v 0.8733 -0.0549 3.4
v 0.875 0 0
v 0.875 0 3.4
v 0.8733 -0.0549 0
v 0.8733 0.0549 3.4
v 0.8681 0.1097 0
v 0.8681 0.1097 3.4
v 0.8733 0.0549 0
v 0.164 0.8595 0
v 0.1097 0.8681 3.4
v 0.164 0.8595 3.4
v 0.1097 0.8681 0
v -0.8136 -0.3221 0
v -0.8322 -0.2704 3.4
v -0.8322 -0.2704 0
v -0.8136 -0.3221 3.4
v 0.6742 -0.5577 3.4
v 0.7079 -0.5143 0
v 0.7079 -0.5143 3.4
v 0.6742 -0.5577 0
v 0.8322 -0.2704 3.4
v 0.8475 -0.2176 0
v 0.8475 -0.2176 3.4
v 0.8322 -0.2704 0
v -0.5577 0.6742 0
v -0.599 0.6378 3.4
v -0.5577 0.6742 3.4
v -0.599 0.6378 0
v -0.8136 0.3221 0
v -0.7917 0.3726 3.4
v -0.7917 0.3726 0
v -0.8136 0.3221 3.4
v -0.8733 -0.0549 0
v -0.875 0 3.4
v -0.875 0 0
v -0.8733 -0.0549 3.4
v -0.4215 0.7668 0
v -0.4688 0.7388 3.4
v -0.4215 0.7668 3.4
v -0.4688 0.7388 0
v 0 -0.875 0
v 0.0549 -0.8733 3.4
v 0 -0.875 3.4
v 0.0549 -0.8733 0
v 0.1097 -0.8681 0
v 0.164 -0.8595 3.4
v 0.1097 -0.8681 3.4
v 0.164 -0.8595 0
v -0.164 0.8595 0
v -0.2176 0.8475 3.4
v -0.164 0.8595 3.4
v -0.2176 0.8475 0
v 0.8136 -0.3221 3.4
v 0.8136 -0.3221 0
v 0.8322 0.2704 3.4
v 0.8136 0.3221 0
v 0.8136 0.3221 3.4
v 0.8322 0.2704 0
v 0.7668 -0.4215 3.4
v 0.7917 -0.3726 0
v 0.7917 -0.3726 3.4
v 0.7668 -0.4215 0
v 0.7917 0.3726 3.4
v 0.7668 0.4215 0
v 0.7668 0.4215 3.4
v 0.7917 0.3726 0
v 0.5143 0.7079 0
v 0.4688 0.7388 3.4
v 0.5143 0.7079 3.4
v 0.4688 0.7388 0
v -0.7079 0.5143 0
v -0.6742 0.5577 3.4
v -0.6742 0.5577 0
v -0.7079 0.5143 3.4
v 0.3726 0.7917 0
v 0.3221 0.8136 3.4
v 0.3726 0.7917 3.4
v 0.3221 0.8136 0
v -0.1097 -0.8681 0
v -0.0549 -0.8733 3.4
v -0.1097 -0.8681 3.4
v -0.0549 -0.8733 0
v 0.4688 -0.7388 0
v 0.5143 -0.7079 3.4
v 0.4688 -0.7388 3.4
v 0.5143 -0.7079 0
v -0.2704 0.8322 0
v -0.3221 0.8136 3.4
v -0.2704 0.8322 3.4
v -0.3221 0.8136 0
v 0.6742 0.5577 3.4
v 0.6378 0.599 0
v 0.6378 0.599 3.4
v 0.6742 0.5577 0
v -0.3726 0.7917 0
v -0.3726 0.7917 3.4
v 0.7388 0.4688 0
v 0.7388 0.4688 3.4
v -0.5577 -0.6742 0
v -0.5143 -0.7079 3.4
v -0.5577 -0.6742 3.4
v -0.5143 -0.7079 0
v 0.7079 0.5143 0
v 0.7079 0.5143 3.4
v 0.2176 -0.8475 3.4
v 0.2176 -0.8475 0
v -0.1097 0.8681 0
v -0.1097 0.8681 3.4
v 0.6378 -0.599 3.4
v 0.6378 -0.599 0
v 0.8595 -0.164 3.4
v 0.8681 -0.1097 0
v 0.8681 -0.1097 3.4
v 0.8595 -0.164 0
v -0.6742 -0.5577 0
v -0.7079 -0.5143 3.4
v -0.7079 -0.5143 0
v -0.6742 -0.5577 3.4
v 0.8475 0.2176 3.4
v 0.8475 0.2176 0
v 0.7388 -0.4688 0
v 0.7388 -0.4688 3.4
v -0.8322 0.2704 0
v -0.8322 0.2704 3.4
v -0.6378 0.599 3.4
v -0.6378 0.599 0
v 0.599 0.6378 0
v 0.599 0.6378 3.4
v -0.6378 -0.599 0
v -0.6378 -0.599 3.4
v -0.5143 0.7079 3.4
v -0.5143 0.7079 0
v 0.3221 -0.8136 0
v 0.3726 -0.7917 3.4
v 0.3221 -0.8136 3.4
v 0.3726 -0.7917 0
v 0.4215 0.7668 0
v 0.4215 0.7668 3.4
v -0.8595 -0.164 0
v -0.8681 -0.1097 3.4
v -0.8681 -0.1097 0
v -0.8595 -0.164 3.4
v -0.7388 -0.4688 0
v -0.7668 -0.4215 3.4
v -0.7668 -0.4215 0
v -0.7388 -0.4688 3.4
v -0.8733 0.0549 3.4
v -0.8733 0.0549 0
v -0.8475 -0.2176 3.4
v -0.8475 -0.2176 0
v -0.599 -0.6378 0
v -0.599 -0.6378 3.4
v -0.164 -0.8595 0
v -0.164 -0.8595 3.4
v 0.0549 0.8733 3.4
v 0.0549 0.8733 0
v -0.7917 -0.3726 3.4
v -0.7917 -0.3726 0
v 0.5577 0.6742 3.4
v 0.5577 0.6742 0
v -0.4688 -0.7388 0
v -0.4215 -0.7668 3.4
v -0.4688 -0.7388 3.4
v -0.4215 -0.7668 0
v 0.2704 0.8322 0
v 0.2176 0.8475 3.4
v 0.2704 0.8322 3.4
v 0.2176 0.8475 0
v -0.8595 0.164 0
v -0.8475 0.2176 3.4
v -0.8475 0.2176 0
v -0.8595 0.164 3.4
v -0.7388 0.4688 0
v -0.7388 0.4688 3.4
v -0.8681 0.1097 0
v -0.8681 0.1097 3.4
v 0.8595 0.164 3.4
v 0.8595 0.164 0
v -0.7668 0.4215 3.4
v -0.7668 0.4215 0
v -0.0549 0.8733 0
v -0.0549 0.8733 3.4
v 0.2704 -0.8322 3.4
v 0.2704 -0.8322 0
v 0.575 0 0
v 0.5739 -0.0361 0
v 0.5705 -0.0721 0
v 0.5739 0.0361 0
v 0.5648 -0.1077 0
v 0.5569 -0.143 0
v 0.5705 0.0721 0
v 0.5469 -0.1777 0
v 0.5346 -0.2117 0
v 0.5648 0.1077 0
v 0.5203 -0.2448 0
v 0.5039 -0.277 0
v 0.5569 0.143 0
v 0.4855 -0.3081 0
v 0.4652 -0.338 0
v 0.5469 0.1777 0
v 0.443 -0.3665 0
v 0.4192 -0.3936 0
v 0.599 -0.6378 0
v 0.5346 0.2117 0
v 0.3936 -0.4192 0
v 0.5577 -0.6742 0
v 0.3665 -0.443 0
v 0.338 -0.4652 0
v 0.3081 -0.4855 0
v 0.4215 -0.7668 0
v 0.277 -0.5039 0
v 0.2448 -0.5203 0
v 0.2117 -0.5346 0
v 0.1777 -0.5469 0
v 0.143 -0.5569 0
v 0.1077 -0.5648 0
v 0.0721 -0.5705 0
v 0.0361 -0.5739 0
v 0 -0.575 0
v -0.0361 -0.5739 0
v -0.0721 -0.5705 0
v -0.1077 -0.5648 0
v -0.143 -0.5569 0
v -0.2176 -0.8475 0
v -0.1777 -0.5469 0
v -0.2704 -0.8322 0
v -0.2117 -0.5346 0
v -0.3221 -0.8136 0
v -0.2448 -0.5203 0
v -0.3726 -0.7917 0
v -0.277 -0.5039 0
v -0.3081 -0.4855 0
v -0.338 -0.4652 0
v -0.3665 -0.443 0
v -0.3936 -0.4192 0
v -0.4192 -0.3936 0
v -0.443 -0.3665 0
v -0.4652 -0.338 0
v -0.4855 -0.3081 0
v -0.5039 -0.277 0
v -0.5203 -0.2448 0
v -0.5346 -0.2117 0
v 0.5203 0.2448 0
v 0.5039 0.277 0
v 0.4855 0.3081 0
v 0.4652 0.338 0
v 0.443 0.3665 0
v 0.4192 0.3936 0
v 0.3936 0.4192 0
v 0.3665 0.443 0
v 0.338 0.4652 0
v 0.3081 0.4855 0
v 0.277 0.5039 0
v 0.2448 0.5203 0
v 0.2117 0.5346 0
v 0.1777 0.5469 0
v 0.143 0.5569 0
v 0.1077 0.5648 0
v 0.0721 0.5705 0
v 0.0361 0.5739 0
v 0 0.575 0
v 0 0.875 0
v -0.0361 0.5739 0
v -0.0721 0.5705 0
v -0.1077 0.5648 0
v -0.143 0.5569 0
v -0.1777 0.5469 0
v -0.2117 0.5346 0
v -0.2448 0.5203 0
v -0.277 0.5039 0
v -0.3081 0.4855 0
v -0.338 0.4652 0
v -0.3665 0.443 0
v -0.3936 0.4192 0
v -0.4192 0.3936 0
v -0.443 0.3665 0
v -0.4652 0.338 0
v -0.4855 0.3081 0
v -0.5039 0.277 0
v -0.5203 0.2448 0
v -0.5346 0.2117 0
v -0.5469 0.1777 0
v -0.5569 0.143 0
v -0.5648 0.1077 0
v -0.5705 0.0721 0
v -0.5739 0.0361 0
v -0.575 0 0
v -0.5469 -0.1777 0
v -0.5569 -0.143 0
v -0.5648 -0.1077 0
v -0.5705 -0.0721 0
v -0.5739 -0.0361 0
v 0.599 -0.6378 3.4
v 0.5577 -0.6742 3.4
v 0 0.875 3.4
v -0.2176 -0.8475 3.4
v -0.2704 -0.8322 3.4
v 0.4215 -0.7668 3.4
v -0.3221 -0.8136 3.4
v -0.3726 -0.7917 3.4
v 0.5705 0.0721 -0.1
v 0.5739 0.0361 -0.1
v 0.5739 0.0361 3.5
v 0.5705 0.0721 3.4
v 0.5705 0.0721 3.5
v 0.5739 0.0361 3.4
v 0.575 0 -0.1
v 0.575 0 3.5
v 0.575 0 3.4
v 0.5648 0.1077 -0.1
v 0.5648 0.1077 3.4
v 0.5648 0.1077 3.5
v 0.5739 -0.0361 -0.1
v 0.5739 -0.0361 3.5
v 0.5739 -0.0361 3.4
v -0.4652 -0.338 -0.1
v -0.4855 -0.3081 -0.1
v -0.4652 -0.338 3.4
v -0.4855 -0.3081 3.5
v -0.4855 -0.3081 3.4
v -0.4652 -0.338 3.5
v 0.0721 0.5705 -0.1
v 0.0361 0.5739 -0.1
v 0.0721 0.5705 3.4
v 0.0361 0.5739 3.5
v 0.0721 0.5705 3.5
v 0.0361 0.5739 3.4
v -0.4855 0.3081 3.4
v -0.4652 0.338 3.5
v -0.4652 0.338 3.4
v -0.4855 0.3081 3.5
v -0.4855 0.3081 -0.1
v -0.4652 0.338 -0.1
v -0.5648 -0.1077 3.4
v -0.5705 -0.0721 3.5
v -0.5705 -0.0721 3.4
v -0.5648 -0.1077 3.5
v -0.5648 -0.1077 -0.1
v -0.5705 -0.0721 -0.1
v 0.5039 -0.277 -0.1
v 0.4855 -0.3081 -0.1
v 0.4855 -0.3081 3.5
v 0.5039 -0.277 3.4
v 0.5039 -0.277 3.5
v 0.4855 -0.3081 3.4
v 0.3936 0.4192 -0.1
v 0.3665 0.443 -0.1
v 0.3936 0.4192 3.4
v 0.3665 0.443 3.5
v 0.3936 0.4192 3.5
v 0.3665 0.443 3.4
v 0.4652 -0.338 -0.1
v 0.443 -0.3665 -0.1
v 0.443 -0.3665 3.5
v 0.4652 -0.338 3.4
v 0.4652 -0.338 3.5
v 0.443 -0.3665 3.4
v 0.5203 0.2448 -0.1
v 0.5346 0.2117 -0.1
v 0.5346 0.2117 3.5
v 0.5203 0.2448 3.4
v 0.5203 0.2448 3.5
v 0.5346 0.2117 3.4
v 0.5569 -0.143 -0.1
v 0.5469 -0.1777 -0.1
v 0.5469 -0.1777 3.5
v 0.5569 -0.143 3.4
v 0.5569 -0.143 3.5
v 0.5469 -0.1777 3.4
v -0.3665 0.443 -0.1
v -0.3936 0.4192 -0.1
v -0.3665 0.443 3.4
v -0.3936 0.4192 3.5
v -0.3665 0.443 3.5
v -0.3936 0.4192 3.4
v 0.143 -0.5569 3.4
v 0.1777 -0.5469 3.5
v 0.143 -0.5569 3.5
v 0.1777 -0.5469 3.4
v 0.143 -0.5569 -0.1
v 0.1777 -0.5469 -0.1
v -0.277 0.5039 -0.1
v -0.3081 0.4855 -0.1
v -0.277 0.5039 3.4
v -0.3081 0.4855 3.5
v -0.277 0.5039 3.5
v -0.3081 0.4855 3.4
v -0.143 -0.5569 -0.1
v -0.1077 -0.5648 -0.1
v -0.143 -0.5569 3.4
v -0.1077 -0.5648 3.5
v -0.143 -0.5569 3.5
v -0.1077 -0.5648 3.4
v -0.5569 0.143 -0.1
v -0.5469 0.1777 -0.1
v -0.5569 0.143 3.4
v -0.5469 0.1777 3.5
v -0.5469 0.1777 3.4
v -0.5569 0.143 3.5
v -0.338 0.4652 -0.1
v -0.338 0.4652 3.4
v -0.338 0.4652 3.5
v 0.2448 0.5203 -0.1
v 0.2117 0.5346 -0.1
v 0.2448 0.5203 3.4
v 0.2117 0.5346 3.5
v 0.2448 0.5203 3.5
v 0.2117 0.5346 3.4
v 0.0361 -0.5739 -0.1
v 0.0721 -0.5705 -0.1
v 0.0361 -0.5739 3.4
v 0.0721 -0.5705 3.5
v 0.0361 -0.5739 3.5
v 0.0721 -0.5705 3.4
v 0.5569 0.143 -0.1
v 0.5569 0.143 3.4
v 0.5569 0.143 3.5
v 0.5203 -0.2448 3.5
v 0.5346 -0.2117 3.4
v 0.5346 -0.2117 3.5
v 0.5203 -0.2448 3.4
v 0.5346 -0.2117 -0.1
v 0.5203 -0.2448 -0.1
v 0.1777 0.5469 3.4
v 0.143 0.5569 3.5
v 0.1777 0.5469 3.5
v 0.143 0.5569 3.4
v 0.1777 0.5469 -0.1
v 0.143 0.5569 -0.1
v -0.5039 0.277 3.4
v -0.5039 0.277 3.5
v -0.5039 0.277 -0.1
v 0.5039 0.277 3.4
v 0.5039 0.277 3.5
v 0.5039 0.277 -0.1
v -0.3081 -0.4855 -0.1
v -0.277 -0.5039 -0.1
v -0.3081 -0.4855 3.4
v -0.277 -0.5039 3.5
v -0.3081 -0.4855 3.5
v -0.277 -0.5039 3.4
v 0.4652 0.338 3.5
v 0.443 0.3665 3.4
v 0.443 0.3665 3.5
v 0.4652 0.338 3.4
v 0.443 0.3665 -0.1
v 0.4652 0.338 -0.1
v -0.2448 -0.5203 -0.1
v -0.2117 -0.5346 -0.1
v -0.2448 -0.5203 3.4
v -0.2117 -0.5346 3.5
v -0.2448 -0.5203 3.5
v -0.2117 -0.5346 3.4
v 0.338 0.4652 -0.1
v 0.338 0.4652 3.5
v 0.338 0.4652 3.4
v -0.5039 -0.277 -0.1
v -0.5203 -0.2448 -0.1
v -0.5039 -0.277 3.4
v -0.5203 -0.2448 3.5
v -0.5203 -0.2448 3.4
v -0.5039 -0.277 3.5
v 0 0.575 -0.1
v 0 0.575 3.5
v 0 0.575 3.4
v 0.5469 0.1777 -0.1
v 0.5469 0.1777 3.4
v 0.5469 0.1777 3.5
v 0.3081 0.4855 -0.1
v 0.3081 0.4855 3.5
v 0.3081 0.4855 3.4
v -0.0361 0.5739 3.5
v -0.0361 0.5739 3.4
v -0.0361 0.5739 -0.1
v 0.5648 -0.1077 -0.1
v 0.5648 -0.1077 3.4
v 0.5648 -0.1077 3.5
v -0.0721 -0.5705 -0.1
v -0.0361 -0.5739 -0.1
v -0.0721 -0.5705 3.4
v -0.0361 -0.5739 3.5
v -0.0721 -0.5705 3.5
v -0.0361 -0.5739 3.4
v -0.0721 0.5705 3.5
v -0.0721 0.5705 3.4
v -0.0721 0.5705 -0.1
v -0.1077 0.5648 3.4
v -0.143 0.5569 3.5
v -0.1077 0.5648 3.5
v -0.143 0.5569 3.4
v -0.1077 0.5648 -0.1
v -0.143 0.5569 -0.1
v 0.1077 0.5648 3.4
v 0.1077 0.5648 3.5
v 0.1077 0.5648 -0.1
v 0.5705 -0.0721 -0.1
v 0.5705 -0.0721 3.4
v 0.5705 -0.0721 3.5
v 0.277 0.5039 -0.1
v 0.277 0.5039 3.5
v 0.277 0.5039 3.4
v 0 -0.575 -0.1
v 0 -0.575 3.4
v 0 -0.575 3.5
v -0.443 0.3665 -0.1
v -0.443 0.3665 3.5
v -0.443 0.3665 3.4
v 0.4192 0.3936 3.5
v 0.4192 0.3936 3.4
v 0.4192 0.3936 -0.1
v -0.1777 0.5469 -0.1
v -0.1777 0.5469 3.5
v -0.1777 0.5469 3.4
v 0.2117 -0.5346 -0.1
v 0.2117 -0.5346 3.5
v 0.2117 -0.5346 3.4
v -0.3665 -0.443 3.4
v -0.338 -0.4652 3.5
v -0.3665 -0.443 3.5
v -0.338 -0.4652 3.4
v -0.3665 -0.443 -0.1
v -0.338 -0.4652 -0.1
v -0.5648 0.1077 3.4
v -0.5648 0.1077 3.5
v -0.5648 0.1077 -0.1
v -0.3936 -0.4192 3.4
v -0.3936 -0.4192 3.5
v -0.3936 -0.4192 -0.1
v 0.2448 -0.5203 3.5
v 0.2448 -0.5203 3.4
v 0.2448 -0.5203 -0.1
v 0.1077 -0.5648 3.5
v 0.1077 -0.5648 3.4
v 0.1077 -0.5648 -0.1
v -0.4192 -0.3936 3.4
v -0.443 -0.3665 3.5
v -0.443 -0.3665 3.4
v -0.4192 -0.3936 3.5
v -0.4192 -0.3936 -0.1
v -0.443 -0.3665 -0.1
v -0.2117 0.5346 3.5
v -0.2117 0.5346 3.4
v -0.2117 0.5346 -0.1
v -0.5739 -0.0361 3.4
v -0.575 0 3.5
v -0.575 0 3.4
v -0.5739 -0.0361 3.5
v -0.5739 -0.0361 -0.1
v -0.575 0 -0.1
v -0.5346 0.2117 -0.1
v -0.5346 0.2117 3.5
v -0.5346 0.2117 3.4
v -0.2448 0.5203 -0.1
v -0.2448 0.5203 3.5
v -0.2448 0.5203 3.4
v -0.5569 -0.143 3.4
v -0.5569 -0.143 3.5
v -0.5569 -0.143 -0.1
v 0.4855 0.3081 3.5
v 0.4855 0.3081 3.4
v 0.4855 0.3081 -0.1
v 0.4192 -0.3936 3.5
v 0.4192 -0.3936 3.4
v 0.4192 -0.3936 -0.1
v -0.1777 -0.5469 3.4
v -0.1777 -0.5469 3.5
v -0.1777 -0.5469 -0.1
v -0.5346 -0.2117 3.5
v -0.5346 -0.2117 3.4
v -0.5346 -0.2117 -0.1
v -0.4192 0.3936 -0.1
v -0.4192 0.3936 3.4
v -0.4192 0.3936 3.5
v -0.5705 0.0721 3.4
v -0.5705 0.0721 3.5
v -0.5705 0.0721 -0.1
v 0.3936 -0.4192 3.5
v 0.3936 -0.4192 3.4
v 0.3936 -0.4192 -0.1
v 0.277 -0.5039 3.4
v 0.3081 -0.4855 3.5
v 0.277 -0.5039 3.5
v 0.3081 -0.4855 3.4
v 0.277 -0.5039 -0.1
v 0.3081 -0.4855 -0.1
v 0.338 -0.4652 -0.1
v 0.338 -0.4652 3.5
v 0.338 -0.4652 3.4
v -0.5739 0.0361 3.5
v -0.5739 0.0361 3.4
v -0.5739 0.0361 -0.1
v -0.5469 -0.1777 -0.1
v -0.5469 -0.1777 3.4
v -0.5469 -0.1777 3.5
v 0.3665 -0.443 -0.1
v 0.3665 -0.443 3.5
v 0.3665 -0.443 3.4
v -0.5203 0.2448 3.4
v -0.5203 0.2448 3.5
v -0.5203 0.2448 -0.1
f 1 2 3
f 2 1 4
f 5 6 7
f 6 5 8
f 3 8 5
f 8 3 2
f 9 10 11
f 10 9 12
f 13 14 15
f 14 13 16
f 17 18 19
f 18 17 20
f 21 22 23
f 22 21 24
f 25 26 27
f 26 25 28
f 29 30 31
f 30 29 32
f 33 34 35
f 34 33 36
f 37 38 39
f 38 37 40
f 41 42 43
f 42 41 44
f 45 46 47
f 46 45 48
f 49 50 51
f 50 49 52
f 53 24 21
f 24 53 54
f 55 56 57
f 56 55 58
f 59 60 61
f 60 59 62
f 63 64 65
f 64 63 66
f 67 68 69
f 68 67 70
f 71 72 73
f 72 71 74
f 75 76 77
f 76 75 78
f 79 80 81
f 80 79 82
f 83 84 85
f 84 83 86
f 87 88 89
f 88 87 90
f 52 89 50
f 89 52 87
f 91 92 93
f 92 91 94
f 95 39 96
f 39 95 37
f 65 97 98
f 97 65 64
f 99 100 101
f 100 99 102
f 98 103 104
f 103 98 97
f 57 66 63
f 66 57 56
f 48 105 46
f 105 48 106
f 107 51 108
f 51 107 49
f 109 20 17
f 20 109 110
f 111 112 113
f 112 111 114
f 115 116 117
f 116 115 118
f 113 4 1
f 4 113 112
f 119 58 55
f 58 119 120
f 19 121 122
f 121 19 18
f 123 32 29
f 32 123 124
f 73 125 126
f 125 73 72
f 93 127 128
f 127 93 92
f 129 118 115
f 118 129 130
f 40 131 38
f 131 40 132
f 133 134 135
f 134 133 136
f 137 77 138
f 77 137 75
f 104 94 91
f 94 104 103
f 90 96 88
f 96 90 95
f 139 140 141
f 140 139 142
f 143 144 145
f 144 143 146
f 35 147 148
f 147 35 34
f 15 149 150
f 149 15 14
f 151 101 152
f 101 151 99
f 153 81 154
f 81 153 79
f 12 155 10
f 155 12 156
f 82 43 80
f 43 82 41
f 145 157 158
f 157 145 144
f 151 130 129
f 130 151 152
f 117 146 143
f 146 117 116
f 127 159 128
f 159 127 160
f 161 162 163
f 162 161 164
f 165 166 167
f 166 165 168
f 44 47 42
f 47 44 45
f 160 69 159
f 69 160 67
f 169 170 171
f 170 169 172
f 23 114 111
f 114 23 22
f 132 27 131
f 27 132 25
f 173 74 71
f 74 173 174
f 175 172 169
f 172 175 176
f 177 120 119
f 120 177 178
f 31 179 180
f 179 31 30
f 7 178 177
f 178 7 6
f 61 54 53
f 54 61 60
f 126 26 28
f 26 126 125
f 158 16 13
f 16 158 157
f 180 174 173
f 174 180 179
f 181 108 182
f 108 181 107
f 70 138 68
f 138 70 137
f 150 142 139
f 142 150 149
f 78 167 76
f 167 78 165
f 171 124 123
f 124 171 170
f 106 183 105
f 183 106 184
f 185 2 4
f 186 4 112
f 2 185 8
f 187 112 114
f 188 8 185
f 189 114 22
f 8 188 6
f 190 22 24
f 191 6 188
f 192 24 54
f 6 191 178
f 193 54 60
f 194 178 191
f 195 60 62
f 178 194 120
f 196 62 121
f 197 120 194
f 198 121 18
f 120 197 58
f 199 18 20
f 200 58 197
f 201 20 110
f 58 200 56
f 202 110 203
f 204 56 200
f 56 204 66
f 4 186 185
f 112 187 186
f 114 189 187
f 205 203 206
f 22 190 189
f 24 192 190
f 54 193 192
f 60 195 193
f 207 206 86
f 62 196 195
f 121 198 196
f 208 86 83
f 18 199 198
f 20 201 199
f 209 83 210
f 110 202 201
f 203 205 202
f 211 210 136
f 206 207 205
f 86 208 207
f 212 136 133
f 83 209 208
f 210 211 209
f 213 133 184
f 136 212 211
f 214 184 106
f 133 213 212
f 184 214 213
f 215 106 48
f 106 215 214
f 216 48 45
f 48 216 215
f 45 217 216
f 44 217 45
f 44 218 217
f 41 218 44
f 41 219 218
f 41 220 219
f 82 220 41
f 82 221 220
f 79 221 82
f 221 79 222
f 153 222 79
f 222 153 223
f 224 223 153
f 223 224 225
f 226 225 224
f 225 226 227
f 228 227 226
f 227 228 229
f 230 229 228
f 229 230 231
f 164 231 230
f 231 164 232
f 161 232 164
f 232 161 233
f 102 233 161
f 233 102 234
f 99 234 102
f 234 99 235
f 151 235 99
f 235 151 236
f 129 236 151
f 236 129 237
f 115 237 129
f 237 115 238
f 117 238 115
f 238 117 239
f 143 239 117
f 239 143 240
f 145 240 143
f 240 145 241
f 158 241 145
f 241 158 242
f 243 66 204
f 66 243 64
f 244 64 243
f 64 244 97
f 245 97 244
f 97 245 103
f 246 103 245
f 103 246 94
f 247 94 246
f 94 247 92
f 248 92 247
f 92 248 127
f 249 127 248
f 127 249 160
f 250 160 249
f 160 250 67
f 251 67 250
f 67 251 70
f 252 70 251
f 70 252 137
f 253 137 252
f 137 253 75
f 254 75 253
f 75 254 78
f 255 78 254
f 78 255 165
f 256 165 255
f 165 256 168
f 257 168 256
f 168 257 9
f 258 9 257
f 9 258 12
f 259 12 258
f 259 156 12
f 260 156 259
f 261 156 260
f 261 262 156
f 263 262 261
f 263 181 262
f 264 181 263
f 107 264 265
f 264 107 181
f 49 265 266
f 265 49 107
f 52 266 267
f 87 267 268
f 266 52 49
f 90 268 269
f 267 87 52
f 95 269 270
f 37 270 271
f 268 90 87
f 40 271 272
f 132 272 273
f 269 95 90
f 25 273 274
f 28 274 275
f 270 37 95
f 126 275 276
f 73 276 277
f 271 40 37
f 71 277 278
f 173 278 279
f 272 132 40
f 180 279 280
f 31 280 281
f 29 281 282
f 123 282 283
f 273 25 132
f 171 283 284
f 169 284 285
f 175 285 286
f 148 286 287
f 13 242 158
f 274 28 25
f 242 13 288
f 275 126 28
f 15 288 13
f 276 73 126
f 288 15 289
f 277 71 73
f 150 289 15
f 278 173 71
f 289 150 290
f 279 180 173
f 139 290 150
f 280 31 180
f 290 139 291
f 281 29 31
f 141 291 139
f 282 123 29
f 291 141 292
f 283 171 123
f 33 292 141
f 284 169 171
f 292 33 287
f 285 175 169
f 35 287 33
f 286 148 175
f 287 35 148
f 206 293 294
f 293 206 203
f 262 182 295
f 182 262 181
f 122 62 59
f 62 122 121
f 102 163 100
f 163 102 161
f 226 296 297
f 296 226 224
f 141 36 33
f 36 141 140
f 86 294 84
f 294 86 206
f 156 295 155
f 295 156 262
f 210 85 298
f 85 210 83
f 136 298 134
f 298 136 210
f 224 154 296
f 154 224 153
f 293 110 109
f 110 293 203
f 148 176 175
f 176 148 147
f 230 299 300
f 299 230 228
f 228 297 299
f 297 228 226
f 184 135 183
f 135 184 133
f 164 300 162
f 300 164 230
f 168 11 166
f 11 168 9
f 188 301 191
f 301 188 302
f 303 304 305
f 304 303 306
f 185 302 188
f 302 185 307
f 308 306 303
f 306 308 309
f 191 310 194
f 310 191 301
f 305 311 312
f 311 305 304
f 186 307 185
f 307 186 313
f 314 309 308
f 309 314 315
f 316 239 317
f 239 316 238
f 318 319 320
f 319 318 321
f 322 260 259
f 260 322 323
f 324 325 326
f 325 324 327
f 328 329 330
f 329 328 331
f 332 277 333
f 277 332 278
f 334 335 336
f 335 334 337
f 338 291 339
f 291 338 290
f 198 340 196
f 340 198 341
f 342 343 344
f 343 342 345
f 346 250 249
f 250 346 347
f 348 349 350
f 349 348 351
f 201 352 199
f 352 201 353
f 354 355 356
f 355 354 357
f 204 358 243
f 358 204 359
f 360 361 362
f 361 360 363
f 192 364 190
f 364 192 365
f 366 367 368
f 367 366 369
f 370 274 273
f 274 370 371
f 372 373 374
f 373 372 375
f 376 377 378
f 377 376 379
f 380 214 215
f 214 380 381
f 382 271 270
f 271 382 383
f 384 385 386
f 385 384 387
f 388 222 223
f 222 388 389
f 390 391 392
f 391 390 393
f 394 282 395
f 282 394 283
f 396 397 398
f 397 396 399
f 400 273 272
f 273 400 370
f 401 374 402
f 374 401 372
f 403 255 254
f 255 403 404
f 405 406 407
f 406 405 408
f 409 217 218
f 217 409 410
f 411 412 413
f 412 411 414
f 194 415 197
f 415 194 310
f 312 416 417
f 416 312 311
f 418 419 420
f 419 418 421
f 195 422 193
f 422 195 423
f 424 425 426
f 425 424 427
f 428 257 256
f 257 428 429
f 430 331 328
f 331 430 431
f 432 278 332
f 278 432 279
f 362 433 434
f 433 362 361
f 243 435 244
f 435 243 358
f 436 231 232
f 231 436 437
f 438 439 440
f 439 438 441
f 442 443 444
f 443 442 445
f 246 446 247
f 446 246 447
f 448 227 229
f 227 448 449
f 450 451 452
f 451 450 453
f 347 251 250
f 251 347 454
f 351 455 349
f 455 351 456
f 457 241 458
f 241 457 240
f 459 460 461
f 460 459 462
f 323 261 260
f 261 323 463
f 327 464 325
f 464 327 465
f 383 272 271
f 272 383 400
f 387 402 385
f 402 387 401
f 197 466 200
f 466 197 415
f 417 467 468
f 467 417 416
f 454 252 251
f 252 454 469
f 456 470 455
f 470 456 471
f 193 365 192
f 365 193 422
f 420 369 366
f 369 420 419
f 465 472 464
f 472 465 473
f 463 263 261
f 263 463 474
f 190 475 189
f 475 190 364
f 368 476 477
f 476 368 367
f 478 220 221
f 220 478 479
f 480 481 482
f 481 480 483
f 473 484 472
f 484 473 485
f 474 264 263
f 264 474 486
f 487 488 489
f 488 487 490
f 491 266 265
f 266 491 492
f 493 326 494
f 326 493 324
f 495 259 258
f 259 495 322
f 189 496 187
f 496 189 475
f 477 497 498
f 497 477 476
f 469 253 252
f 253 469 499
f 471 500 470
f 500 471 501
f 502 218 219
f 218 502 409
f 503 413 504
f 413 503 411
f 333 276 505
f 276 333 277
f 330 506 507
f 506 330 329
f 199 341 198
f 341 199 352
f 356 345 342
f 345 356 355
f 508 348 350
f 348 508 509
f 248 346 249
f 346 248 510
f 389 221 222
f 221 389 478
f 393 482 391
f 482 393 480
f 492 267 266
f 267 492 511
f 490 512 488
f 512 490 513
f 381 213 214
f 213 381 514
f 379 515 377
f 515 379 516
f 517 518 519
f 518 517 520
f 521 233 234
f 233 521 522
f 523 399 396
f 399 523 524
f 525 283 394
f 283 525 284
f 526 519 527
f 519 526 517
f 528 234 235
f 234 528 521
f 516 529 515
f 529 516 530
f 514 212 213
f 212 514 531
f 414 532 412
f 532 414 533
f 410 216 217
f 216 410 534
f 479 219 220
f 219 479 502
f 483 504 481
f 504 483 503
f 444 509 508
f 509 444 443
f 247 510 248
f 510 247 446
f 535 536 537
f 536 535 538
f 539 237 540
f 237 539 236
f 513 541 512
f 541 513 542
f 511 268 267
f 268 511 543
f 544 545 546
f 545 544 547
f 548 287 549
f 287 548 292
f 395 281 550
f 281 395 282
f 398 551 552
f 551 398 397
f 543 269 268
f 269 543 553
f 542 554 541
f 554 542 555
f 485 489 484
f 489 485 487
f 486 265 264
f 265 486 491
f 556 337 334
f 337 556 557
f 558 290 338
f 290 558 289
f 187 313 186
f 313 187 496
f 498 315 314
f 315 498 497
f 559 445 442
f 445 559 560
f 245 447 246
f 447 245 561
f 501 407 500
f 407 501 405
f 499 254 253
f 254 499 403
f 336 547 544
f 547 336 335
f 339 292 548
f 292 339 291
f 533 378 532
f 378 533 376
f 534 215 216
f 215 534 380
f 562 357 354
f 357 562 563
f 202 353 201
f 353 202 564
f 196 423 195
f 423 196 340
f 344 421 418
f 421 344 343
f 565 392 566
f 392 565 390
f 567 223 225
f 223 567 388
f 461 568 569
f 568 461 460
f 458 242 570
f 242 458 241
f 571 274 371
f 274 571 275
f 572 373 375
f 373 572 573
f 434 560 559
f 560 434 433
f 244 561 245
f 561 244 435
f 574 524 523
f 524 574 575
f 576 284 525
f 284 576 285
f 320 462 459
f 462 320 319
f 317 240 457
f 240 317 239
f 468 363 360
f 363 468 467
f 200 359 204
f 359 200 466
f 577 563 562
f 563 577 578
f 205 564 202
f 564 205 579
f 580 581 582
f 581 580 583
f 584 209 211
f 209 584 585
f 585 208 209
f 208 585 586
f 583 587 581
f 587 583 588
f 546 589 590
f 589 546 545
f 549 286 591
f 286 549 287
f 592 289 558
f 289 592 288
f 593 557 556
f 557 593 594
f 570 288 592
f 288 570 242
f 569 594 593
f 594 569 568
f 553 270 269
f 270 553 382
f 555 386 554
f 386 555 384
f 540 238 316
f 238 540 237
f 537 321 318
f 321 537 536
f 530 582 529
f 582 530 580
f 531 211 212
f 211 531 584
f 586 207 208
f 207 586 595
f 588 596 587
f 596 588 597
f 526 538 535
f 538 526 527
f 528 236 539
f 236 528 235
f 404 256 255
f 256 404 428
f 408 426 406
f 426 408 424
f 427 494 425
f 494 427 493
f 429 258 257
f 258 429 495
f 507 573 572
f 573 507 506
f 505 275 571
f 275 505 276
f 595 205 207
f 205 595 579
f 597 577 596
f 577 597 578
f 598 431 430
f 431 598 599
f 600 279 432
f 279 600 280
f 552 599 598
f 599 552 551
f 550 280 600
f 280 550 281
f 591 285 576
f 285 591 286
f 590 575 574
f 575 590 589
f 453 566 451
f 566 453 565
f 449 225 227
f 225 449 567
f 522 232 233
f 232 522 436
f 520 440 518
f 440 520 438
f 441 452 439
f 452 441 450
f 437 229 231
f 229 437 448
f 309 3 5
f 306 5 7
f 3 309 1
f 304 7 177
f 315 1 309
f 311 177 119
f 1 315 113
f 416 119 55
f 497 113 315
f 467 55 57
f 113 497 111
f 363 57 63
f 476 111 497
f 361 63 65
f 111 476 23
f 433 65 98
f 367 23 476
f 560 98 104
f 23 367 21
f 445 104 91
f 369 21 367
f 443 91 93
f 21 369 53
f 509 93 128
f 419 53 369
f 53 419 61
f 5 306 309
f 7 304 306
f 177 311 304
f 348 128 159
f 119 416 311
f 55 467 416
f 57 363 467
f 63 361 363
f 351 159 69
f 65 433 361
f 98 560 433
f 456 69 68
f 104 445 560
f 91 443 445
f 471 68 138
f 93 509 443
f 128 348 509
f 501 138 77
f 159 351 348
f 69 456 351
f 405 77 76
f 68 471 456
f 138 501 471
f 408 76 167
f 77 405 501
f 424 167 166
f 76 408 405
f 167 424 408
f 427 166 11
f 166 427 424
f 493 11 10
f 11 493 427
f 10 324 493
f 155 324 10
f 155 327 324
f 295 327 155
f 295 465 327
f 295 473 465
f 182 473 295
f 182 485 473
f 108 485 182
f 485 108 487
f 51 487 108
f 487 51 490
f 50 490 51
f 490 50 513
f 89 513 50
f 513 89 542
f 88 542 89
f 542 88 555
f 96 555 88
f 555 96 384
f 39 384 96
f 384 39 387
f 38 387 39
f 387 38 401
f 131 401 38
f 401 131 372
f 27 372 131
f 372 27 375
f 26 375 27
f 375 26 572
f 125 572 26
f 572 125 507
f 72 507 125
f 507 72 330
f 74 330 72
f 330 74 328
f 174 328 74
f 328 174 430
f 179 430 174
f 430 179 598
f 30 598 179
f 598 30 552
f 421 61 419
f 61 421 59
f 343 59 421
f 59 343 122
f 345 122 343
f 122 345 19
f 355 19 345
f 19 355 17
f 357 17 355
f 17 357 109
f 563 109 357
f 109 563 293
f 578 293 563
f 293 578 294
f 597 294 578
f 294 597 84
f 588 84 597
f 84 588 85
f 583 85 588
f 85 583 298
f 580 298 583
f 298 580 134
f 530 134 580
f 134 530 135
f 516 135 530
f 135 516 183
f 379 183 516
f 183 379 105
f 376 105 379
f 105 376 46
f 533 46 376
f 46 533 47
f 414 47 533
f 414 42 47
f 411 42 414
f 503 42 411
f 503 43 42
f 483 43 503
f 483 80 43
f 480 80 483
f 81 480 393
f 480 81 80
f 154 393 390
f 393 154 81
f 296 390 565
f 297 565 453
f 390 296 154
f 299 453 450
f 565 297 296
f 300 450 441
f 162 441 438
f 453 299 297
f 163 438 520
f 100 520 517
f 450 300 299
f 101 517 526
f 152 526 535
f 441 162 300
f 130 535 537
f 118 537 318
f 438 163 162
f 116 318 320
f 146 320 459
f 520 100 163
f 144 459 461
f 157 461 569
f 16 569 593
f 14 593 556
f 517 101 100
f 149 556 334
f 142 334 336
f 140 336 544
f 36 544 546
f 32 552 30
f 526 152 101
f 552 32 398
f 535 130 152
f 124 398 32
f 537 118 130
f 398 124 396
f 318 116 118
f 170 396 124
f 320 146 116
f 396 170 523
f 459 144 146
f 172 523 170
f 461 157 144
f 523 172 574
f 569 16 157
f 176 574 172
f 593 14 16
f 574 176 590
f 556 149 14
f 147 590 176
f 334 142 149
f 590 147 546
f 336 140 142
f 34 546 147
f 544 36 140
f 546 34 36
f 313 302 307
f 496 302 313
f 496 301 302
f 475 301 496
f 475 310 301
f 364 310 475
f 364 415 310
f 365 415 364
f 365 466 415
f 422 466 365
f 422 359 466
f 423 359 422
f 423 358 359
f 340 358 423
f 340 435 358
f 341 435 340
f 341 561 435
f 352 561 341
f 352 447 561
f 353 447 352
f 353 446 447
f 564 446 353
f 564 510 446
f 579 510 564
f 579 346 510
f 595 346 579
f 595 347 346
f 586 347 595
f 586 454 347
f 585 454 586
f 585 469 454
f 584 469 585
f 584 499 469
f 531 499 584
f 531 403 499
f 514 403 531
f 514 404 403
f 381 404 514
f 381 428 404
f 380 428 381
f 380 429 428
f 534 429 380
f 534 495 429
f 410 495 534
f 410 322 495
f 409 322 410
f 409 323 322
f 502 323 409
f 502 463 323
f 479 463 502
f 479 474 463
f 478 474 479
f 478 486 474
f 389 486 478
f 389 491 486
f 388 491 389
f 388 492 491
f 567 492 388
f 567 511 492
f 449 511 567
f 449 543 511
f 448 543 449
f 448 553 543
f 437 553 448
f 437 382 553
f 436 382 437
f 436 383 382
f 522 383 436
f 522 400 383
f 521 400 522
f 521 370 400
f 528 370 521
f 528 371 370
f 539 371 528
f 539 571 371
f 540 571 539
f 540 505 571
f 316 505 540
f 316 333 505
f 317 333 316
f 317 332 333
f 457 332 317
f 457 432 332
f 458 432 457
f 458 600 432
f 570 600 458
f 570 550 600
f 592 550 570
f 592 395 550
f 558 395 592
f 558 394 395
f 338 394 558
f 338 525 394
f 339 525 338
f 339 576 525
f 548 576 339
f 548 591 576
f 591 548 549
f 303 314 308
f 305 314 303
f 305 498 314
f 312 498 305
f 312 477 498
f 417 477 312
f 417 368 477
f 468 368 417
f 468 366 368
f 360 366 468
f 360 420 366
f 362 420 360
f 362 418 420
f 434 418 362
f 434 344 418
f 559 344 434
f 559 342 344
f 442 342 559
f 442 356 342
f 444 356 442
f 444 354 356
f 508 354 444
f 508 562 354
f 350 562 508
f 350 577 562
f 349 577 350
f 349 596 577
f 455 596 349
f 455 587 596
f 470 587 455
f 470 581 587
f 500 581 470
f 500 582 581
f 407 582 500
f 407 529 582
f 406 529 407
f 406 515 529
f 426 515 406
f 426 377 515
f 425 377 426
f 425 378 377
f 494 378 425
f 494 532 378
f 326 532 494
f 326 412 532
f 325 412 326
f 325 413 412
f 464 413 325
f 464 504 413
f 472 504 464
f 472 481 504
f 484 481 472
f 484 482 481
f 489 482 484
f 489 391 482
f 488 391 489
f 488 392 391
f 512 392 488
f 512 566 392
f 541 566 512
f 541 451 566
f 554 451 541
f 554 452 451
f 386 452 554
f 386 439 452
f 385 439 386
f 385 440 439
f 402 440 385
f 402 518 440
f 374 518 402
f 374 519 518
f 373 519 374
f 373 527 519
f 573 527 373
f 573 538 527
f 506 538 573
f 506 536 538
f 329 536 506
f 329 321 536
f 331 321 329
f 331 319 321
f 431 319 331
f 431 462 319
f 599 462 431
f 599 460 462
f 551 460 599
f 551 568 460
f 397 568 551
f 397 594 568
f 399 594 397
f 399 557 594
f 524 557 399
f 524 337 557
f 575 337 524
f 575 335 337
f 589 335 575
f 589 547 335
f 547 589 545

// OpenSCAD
module axial_component() {
    axial_body();
    axial_bore();
    end_chamfers();
    edge_fillets();
}

module axial_body() {
    difference() {
        cylinder(h = 3.4, d = 1.75, $fn = 100);
        translate([0, 0, -0.1])
            cylinder(h = 3.6, d = 1.15, $fn = 100);
    }
}

module axial_bore() {
    translate([0, 0, -0.1])
        cylinder(h = 3.6, d = 1.15, $fn = 100);
}

module end_chamfers() {
    translate([0, 0, 3.4])
        rotate([180, 0, 0])
            chamfer();
    chamfer();
}

module chamfer() {
    difference() {
        cylinder(h = 0.3, d1 = 1.75, d2 = 1.15, $fn = 100);
        translate([0, 0, -0.1])
            cylinder(h = 0.4, d = 1.15, $fn = 100);
    }
}

module edge_fillets() {
    translate([0, 0, 3.4])
        rotate([180, 0, 0])
            fillet();
    fillet();
}

module fillet() {
    difference() {
        cylinder(h = 0.3, d = 1.75, $fn = 100);
        translate([0, 0, -0.1])
            cylinder(h = 0.4, d = 1.45, $fn = 100);
    }
}

axial_component();
